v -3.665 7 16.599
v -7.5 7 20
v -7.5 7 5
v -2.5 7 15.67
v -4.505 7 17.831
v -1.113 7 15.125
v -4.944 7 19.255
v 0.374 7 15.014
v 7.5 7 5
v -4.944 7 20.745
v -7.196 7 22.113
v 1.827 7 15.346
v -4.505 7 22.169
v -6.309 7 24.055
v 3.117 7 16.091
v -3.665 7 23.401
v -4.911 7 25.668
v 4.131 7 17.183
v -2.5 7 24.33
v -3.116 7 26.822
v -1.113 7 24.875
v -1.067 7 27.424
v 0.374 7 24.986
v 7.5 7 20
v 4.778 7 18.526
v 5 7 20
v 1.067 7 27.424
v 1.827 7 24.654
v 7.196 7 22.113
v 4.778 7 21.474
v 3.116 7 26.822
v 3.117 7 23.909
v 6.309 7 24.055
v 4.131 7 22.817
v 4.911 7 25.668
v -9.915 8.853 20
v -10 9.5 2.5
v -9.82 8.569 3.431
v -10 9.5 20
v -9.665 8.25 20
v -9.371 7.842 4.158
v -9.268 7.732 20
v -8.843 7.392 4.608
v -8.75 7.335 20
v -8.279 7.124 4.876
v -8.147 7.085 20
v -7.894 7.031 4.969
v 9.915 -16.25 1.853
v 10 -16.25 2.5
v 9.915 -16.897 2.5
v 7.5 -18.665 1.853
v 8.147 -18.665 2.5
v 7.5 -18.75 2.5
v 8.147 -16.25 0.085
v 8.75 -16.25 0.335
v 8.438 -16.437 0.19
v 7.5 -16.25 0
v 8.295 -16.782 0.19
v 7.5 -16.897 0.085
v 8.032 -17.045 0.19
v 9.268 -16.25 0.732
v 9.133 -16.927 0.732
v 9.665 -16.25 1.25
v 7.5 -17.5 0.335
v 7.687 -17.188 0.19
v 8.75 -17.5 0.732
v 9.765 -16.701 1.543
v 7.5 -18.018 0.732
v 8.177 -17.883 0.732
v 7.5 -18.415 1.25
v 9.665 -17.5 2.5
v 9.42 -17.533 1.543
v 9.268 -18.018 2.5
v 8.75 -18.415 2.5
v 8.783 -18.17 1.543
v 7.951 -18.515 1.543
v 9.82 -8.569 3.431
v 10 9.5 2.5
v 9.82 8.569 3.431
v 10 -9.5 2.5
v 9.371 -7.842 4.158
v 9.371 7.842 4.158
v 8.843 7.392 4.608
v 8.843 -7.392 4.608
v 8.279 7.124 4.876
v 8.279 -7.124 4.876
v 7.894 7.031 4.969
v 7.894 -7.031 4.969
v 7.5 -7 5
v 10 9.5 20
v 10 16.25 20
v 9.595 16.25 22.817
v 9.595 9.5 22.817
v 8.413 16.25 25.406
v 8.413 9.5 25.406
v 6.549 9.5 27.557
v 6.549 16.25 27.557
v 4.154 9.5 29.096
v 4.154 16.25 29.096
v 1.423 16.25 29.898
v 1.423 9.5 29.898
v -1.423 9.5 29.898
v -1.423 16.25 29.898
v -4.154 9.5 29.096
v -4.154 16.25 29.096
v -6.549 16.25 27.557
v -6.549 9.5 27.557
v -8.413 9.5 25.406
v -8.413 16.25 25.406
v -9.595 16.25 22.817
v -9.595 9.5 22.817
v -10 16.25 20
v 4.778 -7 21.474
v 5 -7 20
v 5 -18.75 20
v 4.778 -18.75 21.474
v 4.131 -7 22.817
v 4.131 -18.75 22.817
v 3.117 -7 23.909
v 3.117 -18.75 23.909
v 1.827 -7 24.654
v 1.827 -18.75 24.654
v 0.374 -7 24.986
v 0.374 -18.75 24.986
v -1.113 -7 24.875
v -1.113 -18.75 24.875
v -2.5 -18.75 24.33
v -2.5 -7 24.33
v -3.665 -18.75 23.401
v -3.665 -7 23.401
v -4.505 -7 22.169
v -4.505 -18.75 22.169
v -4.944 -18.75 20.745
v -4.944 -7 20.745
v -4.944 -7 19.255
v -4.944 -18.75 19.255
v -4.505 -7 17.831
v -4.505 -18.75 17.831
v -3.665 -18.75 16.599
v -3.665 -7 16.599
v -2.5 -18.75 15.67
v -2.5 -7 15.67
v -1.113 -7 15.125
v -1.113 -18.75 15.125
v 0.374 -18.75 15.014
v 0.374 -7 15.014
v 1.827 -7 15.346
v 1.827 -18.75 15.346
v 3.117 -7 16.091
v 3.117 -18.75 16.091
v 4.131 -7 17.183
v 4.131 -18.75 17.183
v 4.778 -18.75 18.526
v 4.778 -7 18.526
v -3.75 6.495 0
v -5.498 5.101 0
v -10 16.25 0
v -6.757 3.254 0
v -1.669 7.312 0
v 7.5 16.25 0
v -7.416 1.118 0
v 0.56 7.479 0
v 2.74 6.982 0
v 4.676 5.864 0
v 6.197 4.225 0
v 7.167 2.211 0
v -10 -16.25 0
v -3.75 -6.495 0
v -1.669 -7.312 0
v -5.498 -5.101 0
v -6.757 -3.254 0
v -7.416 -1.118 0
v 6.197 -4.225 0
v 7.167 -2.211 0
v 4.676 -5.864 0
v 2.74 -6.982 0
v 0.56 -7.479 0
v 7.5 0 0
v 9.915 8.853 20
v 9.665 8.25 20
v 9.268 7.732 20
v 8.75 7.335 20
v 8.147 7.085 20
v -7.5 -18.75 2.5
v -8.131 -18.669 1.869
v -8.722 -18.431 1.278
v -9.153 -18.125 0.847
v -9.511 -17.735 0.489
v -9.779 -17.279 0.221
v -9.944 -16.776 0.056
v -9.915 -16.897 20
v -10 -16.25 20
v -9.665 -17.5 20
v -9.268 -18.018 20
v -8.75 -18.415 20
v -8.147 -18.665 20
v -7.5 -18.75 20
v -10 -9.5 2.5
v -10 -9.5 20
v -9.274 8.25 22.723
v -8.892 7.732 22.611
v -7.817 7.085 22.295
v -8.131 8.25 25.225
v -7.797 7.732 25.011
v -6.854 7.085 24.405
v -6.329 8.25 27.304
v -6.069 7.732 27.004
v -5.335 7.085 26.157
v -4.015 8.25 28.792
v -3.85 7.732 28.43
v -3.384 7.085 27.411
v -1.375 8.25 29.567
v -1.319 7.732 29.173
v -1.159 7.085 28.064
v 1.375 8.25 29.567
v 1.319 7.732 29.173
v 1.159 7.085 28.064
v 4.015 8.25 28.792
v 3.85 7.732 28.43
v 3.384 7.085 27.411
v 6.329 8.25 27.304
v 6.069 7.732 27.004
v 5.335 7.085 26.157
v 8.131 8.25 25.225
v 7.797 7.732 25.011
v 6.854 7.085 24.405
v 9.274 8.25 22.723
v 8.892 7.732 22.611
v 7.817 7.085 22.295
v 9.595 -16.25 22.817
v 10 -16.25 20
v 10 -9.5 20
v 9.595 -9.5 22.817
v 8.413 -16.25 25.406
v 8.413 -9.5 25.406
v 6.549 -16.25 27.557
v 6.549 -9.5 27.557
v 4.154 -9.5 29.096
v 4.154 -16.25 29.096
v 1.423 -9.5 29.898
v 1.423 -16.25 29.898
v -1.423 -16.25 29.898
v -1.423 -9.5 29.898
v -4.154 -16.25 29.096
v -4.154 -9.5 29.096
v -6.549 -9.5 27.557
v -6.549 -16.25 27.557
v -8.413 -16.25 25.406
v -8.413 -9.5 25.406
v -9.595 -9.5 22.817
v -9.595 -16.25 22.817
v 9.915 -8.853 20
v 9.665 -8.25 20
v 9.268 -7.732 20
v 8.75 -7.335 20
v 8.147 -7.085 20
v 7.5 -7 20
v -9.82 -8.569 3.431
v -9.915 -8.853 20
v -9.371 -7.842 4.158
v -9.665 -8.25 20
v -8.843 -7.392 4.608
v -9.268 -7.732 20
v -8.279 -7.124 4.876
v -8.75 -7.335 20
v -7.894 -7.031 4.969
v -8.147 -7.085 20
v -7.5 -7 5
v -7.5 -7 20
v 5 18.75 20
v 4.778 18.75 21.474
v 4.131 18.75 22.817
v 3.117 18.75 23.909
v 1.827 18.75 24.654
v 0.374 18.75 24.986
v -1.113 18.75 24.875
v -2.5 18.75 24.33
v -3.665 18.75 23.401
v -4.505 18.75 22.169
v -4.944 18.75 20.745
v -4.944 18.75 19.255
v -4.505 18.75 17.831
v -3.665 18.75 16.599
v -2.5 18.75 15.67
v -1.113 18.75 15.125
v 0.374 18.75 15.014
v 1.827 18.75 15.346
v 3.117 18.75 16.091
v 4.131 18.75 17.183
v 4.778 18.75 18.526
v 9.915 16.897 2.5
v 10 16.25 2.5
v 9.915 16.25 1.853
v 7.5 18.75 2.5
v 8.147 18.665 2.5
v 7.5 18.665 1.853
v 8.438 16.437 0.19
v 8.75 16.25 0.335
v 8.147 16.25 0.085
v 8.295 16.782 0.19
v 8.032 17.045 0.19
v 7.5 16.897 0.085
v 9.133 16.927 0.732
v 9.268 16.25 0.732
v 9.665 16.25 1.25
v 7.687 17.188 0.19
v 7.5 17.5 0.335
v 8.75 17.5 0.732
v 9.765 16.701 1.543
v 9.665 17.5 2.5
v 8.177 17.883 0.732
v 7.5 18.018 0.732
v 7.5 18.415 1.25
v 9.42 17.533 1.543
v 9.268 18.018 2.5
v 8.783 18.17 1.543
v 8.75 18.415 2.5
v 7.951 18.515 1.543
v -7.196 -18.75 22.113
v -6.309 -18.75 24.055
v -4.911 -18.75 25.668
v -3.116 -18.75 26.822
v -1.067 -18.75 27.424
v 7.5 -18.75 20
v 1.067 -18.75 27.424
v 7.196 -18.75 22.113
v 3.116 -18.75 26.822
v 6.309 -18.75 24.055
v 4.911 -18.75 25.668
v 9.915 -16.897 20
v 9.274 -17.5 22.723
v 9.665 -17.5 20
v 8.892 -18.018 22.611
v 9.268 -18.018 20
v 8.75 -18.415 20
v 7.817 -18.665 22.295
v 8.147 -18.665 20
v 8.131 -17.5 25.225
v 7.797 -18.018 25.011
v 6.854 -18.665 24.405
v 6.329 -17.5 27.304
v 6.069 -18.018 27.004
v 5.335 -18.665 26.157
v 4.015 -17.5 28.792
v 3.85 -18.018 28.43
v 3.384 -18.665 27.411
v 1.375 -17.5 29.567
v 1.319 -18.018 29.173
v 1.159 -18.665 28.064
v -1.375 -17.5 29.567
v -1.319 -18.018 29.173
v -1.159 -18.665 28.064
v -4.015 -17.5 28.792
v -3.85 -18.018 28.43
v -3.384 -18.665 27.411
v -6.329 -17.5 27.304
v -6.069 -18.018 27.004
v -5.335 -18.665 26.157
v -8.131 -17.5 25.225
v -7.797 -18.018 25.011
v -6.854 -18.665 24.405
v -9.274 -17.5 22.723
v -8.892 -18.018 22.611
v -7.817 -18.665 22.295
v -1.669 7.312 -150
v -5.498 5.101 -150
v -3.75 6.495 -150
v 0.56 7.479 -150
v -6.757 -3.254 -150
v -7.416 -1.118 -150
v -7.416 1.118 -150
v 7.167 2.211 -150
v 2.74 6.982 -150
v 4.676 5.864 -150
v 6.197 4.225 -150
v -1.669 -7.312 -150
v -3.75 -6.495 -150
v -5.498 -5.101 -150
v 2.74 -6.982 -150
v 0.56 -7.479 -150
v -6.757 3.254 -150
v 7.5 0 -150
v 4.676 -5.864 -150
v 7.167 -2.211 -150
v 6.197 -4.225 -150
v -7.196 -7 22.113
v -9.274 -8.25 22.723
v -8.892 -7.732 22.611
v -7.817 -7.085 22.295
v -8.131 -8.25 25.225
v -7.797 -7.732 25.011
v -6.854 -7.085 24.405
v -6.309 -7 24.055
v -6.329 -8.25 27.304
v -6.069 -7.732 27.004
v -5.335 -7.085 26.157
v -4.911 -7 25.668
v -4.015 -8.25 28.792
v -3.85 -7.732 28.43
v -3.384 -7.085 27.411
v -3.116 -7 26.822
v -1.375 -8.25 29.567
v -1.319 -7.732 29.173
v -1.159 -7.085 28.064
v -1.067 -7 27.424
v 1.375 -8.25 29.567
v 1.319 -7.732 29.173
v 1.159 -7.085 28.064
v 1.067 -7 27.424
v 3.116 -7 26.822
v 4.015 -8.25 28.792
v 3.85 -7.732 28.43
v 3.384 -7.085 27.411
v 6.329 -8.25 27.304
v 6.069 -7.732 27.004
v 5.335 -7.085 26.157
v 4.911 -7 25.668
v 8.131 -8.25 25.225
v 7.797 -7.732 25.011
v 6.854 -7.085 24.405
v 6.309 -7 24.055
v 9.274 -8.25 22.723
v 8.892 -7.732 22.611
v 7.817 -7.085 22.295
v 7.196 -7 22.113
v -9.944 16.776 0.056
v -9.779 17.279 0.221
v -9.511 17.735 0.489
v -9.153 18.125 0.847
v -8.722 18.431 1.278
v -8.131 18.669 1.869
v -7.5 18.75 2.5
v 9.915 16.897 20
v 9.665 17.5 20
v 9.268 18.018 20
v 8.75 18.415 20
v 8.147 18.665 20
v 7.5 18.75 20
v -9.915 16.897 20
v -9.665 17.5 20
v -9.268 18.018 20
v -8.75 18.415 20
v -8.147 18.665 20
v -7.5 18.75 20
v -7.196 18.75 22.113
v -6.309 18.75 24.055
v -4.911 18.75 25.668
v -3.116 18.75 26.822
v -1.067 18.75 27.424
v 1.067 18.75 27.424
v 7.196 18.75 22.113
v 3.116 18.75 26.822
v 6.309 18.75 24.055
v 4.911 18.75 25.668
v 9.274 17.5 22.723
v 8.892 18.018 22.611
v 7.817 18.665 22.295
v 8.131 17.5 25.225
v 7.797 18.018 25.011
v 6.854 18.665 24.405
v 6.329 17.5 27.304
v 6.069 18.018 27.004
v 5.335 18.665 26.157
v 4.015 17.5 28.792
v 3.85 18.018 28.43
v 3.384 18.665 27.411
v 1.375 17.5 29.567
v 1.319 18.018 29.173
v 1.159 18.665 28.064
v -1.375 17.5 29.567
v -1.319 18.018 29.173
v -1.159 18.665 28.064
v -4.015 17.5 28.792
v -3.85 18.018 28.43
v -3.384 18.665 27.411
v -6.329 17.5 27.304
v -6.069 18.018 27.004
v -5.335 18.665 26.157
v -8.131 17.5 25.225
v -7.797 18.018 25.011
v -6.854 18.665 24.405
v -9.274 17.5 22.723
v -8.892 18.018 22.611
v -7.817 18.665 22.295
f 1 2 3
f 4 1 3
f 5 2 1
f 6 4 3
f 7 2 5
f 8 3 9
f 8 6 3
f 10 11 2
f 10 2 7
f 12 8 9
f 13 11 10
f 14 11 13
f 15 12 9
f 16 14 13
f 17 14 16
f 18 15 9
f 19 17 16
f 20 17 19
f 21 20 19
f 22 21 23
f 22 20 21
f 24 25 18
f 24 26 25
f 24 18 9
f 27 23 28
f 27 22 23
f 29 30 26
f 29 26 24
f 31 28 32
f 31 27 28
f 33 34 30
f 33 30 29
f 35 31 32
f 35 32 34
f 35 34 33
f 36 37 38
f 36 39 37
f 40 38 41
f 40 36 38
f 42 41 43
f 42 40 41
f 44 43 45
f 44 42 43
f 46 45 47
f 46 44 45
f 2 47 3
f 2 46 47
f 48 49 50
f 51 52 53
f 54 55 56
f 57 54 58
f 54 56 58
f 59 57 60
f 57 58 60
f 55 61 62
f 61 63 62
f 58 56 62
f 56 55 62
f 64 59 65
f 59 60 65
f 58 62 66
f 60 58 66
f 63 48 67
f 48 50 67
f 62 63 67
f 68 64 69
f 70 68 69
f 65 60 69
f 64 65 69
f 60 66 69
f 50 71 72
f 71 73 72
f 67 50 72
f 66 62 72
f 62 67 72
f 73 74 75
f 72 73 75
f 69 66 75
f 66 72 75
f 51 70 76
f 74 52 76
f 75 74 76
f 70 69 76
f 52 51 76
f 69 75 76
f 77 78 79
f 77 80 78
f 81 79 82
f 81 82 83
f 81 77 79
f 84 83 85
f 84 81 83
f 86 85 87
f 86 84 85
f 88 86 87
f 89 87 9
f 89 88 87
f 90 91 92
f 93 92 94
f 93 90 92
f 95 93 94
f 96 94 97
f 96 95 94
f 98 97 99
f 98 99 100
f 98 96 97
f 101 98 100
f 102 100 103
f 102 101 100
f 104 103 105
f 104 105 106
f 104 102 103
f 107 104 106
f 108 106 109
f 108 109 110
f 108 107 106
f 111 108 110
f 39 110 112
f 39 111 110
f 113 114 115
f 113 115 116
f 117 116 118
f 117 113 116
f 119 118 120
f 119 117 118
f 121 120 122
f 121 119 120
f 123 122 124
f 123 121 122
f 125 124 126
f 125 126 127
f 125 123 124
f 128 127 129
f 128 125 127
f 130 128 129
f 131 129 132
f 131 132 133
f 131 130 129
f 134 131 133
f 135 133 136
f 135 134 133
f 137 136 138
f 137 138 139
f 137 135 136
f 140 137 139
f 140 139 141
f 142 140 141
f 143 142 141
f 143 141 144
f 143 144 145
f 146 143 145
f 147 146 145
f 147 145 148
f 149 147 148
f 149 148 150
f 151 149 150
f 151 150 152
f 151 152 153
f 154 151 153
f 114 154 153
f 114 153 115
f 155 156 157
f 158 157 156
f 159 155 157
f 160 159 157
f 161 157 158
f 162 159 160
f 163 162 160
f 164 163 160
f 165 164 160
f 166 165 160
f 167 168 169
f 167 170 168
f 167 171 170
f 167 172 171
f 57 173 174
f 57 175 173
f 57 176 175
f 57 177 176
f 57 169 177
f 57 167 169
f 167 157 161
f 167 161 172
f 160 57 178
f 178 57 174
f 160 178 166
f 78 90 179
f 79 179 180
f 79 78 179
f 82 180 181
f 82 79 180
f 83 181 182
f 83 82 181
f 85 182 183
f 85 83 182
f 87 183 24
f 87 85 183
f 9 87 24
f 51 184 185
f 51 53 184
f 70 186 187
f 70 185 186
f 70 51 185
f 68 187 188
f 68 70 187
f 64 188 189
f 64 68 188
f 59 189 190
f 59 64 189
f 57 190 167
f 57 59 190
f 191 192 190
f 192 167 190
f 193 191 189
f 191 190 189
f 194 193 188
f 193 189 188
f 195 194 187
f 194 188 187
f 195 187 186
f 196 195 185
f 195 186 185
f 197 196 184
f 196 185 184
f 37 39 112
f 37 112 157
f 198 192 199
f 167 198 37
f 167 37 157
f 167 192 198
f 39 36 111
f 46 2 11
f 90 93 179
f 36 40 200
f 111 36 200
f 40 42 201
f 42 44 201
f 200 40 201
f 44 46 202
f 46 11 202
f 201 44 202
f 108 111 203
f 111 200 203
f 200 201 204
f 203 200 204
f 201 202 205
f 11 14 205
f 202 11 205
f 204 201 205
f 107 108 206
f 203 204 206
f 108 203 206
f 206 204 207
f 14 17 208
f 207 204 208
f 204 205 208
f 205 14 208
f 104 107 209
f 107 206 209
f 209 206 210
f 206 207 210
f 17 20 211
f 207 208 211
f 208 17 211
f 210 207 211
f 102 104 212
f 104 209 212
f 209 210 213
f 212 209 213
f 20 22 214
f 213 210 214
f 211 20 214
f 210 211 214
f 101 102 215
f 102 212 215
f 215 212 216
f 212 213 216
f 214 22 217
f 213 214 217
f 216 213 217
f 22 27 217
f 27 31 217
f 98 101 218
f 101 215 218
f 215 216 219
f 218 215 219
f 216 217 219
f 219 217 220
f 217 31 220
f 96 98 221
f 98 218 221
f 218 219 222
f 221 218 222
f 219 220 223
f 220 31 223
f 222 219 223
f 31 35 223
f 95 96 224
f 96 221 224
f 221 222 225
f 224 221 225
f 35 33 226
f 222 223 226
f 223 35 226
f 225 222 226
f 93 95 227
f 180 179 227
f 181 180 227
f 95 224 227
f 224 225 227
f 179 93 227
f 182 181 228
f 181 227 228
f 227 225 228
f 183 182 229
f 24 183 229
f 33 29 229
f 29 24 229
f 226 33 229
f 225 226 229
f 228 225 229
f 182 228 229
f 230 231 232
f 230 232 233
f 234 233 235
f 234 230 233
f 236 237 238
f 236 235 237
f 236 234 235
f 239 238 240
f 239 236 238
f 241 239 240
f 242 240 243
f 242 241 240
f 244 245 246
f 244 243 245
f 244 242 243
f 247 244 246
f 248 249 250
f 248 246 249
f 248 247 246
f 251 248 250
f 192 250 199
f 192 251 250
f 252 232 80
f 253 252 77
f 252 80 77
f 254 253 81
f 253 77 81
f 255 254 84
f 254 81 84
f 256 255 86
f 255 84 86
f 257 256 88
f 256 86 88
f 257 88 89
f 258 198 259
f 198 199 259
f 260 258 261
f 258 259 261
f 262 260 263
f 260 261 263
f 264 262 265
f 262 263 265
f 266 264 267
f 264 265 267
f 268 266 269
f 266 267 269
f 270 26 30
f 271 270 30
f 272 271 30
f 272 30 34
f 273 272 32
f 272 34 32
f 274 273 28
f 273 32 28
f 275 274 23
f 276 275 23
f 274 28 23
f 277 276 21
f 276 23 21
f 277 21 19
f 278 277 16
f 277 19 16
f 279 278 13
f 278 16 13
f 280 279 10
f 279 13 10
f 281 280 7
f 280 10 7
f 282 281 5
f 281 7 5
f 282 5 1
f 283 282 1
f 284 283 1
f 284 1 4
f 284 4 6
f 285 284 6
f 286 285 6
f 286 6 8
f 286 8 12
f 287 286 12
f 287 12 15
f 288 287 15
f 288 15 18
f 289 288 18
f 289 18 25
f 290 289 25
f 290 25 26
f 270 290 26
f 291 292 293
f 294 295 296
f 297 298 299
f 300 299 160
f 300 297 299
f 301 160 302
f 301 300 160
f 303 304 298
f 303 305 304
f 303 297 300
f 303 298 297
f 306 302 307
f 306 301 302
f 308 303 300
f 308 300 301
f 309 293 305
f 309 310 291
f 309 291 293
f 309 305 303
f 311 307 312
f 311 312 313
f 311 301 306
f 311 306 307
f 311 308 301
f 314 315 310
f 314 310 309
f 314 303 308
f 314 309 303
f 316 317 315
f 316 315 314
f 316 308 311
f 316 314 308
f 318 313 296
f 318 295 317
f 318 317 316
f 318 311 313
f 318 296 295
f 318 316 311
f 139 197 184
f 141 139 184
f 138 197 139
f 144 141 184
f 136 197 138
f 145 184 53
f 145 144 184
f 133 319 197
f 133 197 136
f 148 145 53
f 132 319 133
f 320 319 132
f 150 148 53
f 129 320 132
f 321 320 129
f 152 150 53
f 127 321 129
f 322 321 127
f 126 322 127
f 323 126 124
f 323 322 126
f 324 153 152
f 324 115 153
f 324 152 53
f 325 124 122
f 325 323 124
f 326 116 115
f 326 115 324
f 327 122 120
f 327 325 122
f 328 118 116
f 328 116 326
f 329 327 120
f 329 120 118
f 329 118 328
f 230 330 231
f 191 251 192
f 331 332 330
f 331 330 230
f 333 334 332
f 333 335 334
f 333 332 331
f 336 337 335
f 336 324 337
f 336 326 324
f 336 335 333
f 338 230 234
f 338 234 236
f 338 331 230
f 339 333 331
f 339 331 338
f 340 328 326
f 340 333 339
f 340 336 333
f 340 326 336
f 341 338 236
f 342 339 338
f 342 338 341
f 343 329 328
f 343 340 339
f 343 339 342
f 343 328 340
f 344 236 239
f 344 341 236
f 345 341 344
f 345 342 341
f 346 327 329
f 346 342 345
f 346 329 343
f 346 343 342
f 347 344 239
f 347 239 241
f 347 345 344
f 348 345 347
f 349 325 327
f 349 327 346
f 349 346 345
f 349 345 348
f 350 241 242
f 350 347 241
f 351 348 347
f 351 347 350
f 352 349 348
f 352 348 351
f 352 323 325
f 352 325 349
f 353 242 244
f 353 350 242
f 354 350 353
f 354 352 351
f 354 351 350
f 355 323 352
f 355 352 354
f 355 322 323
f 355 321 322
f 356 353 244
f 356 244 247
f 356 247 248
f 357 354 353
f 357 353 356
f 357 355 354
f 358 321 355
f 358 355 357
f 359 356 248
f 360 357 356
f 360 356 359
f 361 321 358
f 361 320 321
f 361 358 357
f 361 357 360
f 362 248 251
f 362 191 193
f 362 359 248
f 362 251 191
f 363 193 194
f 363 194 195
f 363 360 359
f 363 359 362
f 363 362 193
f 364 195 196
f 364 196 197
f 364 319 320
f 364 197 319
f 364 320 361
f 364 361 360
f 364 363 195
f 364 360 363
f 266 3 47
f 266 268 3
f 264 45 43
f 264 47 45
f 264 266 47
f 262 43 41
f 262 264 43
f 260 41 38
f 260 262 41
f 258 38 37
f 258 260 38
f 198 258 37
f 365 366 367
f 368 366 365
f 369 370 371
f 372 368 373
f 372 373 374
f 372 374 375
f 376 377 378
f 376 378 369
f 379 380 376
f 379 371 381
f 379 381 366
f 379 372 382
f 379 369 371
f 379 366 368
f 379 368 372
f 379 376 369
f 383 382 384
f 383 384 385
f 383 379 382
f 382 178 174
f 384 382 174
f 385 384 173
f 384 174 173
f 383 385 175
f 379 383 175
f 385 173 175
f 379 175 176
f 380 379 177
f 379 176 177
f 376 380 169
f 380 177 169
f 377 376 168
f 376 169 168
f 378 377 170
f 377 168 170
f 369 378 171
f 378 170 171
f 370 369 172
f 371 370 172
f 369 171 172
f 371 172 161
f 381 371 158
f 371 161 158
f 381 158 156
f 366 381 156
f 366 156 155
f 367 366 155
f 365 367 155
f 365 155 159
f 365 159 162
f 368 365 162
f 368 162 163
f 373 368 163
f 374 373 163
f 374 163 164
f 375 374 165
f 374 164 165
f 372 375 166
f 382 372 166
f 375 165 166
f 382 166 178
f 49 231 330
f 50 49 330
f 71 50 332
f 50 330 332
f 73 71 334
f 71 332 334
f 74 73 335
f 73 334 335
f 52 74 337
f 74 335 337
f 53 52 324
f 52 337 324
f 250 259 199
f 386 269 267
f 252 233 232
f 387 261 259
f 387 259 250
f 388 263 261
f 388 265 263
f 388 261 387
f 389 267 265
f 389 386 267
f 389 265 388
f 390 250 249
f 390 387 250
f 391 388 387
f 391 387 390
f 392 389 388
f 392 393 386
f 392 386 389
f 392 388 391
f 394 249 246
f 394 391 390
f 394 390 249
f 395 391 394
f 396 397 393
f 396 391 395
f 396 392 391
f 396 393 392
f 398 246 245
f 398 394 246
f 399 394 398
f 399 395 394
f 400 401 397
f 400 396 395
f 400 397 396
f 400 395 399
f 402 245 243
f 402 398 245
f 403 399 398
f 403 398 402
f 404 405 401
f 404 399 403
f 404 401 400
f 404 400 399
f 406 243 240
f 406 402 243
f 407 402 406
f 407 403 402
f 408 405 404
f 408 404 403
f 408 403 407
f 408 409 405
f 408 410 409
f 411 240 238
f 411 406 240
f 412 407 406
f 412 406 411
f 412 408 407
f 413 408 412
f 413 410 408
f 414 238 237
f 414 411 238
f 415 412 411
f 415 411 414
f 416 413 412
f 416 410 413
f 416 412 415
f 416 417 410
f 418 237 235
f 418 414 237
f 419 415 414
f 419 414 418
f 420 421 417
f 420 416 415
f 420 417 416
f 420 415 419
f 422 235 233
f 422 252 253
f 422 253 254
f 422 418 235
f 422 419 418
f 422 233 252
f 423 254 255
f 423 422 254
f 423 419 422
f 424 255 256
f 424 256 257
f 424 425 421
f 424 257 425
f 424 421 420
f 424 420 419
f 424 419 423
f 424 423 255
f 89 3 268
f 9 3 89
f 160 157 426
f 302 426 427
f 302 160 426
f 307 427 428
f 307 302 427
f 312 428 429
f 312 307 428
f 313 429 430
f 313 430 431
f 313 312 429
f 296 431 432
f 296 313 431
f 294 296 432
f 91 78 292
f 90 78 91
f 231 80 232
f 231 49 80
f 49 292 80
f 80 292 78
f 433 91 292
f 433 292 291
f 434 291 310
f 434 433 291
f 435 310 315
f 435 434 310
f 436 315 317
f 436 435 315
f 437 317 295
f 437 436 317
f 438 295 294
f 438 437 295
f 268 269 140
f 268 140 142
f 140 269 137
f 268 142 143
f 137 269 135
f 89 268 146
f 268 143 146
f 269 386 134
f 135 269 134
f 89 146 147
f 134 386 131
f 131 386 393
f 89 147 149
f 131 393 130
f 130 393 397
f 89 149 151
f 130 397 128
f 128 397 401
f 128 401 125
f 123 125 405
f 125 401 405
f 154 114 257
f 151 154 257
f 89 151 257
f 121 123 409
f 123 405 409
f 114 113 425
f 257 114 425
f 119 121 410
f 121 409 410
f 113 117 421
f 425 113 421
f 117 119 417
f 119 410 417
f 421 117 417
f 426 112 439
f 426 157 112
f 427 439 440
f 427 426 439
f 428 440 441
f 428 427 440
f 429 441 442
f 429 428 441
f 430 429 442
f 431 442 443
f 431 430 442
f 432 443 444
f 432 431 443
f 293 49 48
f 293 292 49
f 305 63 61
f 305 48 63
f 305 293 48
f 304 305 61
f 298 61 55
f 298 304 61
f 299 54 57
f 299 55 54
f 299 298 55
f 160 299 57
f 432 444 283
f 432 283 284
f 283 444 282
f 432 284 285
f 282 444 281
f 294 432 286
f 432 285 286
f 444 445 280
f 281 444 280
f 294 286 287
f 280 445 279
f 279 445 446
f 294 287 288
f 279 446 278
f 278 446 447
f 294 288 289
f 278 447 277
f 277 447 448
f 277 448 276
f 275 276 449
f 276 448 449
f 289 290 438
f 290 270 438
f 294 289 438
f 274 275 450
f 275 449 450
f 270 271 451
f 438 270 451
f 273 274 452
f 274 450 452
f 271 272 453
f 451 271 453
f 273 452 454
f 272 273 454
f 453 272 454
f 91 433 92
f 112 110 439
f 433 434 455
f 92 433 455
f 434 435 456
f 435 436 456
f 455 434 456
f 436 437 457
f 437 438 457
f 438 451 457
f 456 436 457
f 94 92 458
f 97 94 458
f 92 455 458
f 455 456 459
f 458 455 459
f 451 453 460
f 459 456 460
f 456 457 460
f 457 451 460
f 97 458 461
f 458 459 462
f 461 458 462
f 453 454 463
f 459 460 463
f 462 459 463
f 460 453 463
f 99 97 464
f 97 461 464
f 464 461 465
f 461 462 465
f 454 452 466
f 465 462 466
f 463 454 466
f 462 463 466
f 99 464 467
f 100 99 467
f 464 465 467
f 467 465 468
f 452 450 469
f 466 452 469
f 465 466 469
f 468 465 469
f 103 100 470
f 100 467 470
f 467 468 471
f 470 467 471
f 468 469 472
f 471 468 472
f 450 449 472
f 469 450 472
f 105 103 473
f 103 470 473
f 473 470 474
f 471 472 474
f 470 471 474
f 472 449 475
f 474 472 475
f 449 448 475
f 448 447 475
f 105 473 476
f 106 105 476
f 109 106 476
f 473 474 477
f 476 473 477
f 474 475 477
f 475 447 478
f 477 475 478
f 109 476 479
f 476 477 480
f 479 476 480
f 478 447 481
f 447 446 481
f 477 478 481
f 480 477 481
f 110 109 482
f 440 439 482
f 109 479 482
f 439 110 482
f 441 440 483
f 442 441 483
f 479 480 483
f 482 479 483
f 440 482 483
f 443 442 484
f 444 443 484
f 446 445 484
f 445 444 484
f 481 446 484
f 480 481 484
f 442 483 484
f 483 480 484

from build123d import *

# Parameters (mm, degrees)
F0_R          = 5
F1_DEPTH      = 18.75
F1_DEPTH_BACK = 18.75
F4_DEPTH      = 7
F4_DEPTH_BACK = 7
F6_R          = 7.5
F7_DEPTH      = 150
F8_R          = 2.49999


# Not quite as in the source:
# - a fillet or chamfer is up to 0.001 mm smaller than in the source, because OpenCascade refuses the exact size
# - a feature names something its author has since deleted; it is built from what else it names


with BuildPart() as f1:
    # F0 (on Front) → F1 (new body, two sides)
    with BuildSketch(Plane.XZ) as f1_sk:
        with BuildLine():
            Line((10, 0), (10, 20))
            ThreePointArc((10, 20), (0, 30), (-10, 20))
            Line((-10, 20), (-10, 0))
            Line((-10, 0), (10, 0))
        make_face()
        with Locations((0, 20)):
            Circle(F0_R, mode=Mode.SUBTRACT)
    extrude(amount=F1_DEPTH)
    extrude(f1_sk.sketch, amount=-F1_DEPTH_BACK)

    # F3 (on offset) → F4 (cut, two sides)
    with BuildSketch(Plane.XZ) as f4_sk:
        Polygon((-12, 5), (0, 5), (12, 5), (12, 35), (-12, 35), align=None)
    extrude(amount=-F4_DEPTH, mode=Mode.SUBTRACT)
    extrude(f4_sk.sketch, amount=F4_DEPTH_BACK, mode=Mode.SUBTRACT)

    # F6 (on offset) → F7 (join)
    with BuildSketch(Plane(origin=(0, 0, 0), x_dir=(1, 0, 0), z_dir=(0, 0, -1))):
        Circle(F6_R)
    extrude(amount=F7_DEPTH)

    # F8 (radius 2.5 in the source; OpenCascade refuses exactly that, so slightly less here)
    f8_edges = [f1.edges().sort_by_distance(p)[0] for p in [
        (10, -7, 12.5),
        (10, 7, 12.5),
        (10, 18.75, 10),
        (10, -18.75, 10),
        (10, 0, 5),
        (-10, 0, 5),
        (10, 0, 0),
        (0, 18.75, 0),
        (0, -18.75, 0),
    ]]
    fillet(f8_edges, radius=F8_R)


solid = f1.part
